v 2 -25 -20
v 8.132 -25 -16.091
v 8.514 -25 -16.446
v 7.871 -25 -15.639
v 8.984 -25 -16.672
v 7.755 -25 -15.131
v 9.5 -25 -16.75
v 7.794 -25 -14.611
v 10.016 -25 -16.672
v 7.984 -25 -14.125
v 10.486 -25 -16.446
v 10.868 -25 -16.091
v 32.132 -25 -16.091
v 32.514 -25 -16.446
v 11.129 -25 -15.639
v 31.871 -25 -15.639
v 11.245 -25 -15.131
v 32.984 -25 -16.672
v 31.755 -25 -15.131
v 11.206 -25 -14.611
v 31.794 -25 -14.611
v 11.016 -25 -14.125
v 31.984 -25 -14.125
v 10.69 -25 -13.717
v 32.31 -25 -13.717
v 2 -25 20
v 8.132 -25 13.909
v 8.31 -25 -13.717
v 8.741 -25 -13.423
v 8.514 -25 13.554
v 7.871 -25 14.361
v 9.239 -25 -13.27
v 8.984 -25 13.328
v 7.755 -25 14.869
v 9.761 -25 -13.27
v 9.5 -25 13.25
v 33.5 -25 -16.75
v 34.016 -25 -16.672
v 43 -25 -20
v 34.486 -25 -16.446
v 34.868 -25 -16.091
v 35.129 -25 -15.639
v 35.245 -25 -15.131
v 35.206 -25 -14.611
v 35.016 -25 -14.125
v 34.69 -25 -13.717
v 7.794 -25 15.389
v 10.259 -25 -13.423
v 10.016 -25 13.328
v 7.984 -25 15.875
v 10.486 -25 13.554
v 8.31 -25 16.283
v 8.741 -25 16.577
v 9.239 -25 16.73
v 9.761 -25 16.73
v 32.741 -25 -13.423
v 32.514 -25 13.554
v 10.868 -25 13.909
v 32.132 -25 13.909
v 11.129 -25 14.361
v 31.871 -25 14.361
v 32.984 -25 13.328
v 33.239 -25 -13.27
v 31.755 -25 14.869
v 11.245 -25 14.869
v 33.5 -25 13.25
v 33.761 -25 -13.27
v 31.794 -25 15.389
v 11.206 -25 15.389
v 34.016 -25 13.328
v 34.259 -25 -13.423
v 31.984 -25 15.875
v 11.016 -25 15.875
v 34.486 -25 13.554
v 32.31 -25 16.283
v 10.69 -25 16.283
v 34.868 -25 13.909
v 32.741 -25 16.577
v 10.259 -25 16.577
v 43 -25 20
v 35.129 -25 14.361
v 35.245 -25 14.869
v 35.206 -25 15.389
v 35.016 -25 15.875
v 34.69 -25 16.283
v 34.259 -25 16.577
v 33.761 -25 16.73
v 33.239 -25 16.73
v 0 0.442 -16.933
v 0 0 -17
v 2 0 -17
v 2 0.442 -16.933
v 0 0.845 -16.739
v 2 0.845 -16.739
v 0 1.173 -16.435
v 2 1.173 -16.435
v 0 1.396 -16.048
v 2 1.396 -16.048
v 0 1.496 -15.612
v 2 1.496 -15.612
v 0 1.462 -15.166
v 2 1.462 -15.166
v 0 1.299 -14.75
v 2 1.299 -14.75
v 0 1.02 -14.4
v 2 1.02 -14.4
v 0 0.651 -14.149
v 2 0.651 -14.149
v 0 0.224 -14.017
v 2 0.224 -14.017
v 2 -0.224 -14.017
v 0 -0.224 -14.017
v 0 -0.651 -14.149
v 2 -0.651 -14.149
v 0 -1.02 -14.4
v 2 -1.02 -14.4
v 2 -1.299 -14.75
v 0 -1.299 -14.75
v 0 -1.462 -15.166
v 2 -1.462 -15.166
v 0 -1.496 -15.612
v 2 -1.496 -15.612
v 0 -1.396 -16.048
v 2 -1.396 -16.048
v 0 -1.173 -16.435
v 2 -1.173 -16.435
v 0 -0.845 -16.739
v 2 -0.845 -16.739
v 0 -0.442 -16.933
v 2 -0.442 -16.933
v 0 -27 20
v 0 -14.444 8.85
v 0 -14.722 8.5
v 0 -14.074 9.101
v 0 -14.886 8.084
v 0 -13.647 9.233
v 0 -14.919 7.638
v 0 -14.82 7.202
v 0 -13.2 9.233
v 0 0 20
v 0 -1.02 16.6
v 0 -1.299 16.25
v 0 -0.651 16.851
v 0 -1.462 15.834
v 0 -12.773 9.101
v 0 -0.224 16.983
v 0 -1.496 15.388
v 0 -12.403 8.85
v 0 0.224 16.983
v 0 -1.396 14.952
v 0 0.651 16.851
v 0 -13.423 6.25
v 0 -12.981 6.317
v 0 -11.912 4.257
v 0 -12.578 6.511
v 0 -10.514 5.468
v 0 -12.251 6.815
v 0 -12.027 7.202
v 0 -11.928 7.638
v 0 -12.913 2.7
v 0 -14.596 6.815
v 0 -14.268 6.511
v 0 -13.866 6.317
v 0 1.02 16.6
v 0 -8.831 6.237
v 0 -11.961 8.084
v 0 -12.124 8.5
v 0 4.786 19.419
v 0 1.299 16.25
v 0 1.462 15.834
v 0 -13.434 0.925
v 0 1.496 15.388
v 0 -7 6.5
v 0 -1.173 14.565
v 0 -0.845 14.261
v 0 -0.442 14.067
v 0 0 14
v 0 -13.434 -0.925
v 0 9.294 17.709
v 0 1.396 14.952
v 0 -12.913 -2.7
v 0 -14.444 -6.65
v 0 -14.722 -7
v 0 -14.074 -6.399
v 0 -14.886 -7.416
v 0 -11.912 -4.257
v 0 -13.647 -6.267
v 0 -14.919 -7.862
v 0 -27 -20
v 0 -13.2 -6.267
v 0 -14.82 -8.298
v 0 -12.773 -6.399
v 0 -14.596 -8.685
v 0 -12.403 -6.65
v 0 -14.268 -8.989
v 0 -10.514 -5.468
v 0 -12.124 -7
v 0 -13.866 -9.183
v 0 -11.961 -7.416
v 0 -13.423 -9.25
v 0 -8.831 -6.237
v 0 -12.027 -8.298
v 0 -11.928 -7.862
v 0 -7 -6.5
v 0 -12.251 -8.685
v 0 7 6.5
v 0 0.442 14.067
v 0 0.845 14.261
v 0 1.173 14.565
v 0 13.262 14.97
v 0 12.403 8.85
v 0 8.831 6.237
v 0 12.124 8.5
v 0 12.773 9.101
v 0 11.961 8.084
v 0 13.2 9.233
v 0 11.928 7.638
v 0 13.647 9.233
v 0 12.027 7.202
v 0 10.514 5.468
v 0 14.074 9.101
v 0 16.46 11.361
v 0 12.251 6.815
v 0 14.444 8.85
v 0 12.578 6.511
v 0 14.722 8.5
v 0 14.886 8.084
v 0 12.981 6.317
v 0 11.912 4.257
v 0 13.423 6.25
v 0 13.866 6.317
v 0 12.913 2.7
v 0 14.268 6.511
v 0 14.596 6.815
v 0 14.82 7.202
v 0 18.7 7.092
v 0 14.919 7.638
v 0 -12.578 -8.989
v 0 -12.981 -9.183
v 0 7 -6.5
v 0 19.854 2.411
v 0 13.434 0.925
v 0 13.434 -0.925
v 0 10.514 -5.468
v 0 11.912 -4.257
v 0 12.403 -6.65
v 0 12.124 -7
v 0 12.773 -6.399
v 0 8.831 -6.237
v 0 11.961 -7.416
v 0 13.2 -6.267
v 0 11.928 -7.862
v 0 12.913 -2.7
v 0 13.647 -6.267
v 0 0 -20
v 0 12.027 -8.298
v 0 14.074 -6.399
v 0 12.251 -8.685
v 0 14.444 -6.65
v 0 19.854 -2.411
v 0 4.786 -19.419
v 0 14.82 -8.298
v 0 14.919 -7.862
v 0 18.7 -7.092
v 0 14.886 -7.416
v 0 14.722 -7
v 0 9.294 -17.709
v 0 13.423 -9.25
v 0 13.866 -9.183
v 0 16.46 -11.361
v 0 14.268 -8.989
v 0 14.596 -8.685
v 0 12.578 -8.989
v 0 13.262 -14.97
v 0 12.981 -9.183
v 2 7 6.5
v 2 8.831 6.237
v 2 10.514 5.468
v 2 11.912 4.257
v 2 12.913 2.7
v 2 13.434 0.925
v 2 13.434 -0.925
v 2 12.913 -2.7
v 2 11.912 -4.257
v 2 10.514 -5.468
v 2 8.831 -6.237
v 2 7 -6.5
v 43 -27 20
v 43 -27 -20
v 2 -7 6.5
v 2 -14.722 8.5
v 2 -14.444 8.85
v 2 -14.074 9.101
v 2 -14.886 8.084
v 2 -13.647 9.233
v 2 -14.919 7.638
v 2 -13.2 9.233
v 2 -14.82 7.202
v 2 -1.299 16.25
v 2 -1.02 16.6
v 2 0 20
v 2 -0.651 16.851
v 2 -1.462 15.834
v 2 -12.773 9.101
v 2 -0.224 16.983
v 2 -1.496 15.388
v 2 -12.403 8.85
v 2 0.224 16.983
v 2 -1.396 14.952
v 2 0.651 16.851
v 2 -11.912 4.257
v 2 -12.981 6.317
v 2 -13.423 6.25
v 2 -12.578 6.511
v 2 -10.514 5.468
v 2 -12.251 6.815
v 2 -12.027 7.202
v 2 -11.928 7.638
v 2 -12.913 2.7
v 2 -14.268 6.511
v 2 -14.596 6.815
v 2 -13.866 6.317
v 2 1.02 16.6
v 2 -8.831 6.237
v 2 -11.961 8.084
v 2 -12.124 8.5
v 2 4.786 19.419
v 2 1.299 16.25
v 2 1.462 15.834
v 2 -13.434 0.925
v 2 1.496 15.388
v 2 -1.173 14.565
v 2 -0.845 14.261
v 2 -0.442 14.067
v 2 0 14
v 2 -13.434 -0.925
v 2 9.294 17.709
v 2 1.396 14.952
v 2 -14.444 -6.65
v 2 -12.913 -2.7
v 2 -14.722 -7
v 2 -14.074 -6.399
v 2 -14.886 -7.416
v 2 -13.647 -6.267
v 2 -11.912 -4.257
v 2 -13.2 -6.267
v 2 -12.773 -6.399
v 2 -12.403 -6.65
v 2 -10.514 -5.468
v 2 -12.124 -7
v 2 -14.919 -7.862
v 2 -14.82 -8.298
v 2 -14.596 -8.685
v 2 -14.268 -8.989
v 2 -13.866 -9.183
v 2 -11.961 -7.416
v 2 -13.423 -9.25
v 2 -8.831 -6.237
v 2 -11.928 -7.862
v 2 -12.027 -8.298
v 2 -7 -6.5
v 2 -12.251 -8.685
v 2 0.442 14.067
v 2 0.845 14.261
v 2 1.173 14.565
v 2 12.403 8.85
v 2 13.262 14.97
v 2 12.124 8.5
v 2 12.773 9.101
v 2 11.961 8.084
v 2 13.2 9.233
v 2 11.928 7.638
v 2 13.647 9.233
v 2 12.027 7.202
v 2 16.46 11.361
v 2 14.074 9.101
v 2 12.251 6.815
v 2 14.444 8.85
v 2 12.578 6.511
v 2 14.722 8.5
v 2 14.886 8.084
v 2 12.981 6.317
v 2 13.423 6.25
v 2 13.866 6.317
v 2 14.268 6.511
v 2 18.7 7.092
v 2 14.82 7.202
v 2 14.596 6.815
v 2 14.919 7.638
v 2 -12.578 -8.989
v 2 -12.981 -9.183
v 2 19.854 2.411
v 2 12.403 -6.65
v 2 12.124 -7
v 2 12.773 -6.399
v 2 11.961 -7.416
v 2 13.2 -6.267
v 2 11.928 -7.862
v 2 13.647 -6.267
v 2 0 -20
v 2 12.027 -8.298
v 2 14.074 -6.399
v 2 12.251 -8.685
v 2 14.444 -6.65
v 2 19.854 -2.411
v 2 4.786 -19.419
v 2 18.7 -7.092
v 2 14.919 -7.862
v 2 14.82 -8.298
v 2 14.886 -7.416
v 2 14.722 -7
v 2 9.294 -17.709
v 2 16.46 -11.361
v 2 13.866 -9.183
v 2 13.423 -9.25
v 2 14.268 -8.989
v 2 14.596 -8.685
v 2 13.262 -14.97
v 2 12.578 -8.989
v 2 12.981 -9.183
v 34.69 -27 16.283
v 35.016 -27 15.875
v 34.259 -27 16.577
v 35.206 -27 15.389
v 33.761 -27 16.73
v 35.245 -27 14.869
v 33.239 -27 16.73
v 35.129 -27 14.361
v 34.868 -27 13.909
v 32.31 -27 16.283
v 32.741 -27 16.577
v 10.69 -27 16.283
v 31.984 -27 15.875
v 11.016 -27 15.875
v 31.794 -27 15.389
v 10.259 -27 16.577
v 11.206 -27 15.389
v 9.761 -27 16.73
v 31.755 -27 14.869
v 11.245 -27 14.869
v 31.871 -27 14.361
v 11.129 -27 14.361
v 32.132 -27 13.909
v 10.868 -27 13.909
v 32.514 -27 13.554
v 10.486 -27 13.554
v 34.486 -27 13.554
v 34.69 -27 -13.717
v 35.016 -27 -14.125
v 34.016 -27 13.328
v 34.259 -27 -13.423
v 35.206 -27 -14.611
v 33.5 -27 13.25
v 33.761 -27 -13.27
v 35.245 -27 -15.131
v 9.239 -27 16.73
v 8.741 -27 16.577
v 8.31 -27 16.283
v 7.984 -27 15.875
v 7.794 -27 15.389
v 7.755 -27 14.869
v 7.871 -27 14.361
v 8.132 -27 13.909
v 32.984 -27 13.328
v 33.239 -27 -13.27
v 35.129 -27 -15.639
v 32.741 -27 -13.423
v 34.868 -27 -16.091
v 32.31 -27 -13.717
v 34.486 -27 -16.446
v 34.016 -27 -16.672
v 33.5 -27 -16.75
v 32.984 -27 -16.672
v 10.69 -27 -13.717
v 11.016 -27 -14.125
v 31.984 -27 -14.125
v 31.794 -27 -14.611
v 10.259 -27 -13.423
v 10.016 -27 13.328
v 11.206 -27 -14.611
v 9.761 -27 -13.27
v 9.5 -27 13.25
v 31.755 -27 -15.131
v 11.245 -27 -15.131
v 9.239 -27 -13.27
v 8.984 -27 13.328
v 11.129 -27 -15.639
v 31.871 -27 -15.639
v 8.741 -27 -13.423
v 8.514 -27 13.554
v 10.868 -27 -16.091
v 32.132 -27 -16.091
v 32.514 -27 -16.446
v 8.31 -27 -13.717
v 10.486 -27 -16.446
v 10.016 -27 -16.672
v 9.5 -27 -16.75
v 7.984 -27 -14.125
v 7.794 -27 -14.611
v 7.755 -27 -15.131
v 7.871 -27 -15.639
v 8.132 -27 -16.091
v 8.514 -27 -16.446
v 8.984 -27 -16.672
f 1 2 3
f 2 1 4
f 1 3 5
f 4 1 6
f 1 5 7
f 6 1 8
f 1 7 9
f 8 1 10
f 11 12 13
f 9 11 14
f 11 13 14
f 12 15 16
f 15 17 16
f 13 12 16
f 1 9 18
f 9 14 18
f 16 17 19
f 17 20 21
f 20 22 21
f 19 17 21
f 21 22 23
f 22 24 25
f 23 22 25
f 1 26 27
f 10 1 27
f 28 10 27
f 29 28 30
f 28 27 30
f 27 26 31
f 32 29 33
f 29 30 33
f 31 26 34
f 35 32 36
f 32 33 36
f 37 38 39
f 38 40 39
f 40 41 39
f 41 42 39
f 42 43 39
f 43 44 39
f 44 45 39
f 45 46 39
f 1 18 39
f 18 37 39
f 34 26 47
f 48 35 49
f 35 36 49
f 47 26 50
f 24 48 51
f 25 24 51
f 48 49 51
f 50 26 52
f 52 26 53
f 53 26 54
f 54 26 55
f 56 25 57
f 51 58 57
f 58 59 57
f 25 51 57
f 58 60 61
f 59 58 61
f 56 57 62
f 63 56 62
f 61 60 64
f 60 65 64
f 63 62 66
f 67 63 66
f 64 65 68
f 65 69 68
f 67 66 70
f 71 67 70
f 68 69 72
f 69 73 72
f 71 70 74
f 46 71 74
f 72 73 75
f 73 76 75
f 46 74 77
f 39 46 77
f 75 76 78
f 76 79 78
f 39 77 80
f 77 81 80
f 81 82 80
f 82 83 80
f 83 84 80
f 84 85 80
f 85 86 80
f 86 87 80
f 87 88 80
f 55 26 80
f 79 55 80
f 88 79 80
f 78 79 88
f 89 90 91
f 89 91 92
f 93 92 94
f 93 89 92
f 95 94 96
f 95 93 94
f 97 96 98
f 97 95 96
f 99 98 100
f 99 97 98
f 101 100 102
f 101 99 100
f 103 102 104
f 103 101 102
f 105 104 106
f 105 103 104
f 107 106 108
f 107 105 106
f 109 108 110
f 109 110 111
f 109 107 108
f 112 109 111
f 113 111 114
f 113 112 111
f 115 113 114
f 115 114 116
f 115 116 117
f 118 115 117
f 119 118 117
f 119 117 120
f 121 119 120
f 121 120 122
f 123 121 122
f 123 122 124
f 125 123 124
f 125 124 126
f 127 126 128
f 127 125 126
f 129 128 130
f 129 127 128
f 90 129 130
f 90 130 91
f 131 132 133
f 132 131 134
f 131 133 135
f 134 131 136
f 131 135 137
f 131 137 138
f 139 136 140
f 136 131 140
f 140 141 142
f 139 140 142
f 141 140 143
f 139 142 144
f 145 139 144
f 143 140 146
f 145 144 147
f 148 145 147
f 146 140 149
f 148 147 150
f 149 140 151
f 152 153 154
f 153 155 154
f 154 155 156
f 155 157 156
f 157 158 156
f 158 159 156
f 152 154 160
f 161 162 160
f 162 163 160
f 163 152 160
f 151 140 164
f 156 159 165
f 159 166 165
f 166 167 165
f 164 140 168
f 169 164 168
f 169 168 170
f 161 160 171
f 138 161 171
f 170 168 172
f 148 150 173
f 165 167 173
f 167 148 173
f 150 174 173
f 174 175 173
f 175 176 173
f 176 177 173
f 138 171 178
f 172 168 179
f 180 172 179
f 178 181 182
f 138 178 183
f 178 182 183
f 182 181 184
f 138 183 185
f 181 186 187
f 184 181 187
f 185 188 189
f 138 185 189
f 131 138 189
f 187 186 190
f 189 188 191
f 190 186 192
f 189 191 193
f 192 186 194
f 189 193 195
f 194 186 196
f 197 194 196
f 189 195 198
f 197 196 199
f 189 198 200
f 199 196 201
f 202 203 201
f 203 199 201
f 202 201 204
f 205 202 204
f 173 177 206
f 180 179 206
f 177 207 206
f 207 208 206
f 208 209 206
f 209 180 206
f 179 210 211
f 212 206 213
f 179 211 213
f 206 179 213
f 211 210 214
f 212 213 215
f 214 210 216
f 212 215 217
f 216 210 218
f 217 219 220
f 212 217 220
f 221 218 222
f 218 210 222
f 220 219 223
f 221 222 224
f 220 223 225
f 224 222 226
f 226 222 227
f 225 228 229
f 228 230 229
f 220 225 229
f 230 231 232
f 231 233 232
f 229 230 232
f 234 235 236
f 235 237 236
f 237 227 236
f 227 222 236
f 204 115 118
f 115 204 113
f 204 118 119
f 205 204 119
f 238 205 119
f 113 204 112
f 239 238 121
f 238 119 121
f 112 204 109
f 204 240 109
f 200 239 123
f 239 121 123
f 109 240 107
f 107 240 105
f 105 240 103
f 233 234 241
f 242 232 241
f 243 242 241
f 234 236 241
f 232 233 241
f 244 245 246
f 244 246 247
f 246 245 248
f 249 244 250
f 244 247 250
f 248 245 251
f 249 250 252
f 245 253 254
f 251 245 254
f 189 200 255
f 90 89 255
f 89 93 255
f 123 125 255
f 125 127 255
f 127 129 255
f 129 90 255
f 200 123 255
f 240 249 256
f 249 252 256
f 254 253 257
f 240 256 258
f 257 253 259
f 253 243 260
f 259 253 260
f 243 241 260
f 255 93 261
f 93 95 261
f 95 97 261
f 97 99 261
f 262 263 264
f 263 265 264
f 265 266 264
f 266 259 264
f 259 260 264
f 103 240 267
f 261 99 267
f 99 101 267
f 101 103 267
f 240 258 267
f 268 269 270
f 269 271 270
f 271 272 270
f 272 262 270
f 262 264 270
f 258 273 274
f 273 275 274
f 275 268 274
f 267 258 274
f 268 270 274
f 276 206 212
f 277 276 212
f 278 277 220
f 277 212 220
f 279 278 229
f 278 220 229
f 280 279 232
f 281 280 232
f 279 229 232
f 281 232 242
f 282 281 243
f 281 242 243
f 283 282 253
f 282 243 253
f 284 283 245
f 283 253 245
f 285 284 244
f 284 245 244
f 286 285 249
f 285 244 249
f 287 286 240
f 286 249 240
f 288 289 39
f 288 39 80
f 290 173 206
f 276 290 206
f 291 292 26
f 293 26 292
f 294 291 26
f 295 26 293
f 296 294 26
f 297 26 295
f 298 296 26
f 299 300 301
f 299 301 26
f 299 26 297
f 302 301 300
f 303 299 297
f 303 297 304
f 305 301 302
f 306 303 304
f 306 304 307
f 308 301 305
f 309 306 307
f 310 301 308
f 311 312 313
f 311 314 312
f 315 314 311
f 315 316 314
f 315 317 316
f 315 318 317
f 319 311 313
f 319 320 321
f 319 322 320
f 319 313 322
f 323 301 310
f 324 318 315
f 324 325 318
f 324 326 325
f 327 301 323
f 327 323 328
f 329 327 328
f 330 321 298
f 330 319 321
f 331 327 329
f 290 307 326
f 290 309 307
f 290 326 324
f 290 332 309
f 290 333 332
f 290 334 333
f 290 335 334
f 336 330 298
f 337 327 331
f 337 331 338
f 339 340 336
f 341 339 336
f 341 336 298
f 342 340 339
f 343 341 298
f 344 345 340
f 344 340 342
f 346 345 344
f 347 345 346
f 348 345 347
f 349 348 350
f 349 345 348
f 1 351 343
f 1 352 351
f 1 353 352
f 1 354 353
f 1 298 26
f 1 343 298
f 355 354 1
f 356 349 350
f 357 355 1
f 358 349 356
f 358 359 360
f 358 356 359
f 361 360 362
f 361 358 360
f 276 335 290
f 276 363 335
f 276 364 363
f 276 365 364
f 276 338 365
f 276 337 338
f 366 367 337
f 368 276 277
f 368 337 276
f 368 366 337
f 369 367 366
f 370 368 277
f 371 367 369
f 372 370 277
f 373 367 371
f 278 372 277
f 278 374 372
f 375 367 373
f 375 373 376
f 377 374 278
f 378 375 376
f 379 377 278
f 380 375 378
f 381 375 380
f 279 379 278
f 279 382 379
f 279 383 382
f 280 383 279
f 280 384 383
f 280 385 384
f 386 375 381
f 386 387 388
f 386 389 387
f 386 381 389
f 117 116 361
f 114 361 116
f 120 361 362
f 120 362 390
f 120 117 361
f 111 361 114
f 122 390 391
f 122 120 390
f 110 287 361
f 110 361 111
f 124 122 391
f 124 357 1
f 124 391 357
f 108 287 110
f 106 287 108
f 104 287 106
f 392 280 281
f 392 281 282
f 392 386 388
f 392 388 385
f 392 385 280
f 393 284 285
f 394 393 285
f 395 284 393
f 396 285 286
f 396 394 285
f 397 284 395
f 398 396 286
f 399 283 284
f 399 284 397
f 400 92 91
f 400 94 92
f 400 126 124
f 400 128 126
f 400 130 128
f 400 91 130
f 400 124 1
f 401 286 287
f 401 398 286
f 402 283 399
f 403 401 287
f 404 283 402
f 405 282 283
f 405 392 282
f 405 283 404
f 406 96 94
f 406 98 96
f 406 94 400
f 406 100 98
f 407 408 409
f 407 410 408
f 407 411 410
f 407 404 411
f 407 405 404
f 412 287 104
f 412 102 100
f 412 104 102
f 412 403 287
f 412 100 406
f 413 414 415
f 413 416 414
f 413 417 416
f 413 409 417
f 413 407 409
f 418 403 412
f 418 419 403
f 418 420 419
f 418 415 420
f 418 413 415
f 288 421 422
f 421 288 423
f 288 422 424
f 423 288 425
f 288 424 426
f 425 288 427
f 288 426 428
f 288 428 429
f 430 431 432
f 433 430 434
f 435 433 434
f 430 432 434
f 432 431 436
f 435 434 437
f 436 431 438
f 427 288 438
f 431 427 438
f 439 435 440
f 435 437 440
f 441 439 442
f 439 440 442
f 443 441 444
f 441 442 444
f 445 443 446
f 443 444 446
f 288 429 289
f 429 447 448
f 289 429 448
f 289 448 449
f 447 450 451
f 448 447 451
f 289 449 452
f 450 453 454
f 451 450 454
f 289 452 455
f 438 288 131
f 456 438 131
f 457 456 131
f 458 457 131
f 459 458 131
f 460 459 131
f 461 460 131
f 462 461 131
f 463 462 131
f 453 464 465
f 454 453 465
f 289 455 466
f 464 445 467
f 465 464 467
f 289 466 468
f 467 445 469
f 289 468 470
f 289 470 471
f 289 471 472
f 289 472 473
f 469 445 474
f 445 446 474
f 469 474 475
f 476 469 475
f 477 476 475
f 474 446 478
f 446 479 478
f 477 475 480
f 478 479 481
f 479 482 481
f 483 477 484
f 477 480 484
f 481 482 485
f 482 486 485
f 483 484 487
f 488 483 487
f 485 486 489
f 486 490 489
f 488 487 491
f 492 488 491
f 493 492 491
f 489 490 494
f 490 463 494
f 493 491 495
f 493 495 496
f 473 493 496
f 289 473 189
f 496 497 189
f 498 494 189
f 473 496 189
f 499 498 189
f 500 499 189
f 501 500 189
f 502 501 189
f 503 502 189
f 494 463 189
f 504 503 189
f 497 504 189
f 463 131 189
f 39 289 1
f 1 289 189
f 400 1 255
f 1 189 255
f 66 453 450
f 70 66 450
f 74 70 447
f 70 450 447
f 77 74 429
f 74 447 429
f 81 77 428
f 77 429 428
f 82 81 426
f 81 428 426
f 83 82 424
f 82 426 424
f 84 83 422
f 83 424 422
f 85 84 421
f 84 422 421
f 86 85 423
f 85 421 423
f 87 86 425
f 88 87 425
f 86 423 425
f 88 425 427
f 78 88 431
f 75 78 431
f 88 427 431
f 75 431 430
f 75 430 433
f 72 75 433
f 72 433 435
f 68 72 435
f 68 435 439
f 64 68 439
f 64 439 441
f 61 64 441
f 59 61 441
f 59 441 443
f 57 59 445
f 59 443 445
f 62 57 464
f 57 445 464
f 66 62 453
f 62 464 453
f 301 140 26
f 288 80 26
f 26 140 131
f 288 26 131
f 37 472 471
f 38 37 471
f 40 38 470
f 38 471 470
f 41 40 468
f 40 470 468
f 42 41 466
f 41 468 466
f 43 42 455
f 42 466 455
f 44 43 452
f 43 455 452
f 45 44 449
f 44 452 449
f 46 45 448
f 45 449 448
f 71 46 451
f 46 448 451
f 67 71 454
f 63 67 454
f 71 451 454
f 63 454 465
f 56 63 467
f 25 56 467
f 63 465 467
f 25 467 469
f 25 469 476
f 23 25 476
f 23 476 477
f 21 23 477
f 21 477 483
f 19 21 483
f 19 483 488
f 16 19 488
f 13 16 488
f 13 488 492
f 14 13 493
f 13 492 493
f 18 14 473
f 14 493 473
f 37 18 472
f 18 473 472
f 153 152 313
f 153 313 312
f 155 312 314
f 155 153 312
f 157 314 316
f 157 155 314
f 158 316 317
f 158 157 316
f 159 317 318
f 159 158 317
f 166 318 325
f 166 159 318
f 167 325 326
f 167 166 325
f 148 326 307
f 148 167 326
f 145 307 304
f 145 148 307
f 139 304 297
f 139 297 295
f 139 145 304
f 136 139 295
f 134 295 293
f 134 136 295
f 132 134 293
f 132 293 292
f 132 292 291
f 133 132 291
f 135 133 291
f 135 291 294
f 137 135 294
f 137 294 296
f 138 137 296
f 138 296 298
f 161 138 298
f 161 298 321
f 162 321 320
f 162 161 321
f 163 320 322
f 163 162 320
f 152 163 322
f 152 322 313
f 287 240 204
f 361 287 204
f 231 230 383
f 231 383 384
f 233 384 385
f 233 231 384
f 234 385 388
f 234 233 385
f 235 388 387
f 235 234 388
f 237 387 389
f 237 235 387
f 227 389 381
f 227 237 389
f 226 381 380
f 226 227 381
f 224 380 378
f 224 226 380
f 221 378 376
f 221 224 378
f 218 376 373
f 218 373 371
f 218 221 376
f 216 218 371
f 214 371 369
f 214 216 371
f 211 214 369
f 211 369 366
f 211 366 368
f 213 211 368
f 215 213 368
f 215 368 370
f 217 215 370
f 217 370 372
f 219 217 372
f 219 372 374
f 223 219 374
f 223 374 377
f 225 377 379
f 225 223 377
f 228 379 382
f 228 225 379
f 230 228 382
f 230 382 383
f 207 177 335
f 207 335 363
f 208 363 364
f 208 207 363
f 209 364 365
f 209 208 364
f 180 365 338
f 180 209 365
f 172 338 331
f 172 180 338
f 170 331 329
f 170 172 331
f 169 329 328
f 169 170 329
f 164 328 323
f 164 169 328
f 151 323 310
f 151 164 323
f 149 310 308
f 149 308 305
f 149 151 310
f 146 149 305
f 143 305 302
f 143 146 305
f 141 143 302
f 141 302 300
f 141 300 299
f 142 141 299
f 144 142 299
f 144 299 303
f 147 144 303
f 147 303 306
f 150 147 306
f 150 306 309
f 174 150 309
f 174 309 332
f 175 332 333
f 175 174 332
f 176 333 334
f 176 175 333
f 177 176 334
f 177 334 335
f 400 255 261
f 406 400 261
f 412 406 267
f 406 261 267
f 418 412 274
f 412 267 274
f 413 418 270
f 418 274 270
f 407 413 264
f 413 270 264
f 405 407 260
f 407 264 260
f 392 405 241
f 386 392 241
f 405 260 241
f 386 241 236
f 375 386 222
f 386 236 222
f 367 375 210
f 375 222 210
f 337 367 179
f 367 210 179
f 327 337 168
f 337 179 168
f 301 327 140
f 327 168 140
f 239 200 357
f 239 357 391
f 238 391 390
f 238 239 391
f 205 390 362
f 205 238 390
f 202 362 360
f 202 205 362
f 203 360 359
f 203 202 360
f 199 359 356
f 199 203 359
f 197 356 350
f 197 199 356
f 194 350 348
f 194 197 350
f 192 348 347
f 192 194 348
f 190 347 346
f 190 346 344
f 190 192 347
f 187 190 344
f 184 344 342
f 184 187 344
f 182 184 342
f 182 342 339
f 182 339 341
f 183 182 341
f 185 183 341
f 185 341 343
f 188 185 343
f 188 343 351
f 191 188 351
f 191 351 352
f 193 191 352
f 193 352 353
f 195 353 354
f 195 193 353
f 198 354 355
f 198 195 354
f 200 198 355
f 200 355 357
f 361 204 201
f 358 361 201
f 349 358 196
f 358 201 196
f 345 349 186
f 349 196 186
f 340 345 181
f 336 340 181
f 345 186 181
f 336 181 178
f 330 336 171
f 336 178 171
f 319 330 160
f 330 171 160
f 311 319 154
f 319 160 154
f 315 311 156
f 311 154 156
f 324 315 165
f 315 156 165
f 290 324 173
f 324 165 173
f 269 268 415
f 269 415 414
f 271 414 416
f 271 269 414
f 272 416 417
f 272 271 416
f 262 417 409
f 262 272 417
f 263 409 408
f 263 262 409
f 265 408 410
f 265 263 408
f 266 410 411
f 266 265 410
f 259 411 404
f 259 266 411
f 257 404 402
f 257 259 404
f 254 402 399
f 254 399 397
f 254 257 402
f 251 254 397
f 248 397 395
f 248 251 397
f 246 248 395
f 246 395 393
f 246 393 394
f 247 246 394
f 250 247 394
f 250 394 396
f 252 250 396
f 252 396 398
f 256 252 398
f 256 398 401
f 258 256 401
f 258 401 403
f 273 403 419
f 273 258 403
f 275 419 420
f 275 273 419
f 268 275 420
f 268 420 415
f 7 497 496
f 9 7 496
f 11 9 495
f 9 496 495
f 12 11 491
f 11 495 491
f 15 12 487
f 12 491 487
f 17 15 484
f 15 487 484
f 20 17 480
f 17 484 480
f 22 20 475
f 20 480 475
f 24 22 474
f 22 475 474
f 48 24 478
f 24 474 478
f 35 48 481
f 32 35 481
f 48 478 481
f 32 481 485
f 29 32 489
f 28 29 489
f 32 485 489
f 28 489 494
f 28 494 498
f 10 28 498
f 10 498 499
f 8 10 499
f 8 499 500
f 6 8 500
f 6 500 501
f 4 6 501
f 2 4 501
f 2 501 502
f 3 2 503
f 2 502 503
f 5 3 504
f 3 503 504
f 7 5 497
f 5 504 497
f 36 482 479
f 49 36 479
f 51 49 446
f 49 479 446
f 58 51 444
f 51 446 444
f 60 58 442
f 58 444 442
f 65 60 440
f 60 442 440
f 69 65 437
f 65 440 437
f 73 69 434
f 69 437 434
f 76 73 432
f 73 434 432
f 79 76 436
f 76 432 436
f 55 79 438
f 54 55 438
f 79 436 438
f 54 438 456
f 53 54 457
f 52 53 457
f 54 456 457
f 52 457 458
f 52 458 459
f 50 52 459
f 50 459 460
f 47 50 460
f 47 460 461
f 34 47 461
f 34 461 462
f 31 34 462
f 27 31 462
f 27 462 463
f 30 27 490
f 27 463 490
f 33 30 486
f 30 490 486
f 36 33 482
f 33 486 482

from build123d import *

# Parameters (mm, degrees)
SKETCH_1_R      = 1.5
EXTRUDE_1_DEPTH = 2
SKETCH_3_W      = 43
SKETCH_3_H      = 40
SKETCH_3_R      = 1.75
EXTRUDE_2_DEPTH = 2


with BuildPart() as part:
    # 草图1 → 凸台-拉伸1 (new body)
    with BuildSketch(Plane(origin=(0, 0, 0), x_dir=(0, 0, -1), z_dir=(1, 0, 0))):
        with BuildLine():
            Line((-20, 0), (-20, -27))
            Line((-20, -27), (20, -27))
            Line((20, -27), (20, 0))
            ThreePointArc((20, 0), (0, 20), (-20, 0))
        make_face()
        with Locations((-15.5, 0)):
            Circle(SKETCH_1_R, mode=Mode.SUBTRACT)
        with Locations((-7.75, 13.423393759)):
            Circle(SKETCH_1_R, mode=Mode.SUBTRACT)
        with Locations((7.75, 13.423393759)):
            Circle(SKETCH_1_R, mode=Mode.SUBTRACT)
        with Locations((15.5, 0)):
            Circle(SKETCH_1_R, mode=Mode.SUBTRACT)
        with Locations((7.75, -13.423393759)):
            Circle(SKETCH_1_R, mode=Mode.SUBTRACT)
        with Locations((-7.75, -13.423393759)):
            Circle(SKETCH_1_R, mode=Mode.SUBTRACT)
        with BuildLine():
            Line((6.5, 7), (6.5, -7))
            ThreePointArc((6.5, -7), (0, -13.5), (-6.5, -7))
            Line((-6.5, -7), (-6.5, 7))
            ThreePointArc((-6.5, 7), (0, 13.5), (6.5, 7))
        make_face(mode=Mode.SUBTRACT)
    extrude(amount=EXTRUDE_1_DEPTH)

    # 草图3 → 凸台-拉伸2 (add)
    with BuildSketch(Plane.XZ.offset(27)):
        with Locations((21.5, 0)):
            Rectangle(SKETCH_3_W, SKETCH_3_H)
        with Locations(Location((9.5, 15, 0), (0, 0, 270))):
            Circle(SKETCH_3_R, mode=Mode.SUBTRACT)
        with Locations(Location((9.5, -15, 0), (0, 0, 270))):
            Circle(SKETCH_3_R, mode=Mode.SUBTRACT)
        with Locations(Location((33.5, 15, 0), (0, 0, 270))):
            Circle(SKETCH_3_R, mode=Mode.SUBTRACT)
        with Locations(Location((33.5, -15, 0), (0, 0, 270))):
            Circle(SKETCH_3_R, mode=Mode.SUBTRACT)
    extrude(amount=-EXTRUDE_2_DEPTH)


solid = part.part
